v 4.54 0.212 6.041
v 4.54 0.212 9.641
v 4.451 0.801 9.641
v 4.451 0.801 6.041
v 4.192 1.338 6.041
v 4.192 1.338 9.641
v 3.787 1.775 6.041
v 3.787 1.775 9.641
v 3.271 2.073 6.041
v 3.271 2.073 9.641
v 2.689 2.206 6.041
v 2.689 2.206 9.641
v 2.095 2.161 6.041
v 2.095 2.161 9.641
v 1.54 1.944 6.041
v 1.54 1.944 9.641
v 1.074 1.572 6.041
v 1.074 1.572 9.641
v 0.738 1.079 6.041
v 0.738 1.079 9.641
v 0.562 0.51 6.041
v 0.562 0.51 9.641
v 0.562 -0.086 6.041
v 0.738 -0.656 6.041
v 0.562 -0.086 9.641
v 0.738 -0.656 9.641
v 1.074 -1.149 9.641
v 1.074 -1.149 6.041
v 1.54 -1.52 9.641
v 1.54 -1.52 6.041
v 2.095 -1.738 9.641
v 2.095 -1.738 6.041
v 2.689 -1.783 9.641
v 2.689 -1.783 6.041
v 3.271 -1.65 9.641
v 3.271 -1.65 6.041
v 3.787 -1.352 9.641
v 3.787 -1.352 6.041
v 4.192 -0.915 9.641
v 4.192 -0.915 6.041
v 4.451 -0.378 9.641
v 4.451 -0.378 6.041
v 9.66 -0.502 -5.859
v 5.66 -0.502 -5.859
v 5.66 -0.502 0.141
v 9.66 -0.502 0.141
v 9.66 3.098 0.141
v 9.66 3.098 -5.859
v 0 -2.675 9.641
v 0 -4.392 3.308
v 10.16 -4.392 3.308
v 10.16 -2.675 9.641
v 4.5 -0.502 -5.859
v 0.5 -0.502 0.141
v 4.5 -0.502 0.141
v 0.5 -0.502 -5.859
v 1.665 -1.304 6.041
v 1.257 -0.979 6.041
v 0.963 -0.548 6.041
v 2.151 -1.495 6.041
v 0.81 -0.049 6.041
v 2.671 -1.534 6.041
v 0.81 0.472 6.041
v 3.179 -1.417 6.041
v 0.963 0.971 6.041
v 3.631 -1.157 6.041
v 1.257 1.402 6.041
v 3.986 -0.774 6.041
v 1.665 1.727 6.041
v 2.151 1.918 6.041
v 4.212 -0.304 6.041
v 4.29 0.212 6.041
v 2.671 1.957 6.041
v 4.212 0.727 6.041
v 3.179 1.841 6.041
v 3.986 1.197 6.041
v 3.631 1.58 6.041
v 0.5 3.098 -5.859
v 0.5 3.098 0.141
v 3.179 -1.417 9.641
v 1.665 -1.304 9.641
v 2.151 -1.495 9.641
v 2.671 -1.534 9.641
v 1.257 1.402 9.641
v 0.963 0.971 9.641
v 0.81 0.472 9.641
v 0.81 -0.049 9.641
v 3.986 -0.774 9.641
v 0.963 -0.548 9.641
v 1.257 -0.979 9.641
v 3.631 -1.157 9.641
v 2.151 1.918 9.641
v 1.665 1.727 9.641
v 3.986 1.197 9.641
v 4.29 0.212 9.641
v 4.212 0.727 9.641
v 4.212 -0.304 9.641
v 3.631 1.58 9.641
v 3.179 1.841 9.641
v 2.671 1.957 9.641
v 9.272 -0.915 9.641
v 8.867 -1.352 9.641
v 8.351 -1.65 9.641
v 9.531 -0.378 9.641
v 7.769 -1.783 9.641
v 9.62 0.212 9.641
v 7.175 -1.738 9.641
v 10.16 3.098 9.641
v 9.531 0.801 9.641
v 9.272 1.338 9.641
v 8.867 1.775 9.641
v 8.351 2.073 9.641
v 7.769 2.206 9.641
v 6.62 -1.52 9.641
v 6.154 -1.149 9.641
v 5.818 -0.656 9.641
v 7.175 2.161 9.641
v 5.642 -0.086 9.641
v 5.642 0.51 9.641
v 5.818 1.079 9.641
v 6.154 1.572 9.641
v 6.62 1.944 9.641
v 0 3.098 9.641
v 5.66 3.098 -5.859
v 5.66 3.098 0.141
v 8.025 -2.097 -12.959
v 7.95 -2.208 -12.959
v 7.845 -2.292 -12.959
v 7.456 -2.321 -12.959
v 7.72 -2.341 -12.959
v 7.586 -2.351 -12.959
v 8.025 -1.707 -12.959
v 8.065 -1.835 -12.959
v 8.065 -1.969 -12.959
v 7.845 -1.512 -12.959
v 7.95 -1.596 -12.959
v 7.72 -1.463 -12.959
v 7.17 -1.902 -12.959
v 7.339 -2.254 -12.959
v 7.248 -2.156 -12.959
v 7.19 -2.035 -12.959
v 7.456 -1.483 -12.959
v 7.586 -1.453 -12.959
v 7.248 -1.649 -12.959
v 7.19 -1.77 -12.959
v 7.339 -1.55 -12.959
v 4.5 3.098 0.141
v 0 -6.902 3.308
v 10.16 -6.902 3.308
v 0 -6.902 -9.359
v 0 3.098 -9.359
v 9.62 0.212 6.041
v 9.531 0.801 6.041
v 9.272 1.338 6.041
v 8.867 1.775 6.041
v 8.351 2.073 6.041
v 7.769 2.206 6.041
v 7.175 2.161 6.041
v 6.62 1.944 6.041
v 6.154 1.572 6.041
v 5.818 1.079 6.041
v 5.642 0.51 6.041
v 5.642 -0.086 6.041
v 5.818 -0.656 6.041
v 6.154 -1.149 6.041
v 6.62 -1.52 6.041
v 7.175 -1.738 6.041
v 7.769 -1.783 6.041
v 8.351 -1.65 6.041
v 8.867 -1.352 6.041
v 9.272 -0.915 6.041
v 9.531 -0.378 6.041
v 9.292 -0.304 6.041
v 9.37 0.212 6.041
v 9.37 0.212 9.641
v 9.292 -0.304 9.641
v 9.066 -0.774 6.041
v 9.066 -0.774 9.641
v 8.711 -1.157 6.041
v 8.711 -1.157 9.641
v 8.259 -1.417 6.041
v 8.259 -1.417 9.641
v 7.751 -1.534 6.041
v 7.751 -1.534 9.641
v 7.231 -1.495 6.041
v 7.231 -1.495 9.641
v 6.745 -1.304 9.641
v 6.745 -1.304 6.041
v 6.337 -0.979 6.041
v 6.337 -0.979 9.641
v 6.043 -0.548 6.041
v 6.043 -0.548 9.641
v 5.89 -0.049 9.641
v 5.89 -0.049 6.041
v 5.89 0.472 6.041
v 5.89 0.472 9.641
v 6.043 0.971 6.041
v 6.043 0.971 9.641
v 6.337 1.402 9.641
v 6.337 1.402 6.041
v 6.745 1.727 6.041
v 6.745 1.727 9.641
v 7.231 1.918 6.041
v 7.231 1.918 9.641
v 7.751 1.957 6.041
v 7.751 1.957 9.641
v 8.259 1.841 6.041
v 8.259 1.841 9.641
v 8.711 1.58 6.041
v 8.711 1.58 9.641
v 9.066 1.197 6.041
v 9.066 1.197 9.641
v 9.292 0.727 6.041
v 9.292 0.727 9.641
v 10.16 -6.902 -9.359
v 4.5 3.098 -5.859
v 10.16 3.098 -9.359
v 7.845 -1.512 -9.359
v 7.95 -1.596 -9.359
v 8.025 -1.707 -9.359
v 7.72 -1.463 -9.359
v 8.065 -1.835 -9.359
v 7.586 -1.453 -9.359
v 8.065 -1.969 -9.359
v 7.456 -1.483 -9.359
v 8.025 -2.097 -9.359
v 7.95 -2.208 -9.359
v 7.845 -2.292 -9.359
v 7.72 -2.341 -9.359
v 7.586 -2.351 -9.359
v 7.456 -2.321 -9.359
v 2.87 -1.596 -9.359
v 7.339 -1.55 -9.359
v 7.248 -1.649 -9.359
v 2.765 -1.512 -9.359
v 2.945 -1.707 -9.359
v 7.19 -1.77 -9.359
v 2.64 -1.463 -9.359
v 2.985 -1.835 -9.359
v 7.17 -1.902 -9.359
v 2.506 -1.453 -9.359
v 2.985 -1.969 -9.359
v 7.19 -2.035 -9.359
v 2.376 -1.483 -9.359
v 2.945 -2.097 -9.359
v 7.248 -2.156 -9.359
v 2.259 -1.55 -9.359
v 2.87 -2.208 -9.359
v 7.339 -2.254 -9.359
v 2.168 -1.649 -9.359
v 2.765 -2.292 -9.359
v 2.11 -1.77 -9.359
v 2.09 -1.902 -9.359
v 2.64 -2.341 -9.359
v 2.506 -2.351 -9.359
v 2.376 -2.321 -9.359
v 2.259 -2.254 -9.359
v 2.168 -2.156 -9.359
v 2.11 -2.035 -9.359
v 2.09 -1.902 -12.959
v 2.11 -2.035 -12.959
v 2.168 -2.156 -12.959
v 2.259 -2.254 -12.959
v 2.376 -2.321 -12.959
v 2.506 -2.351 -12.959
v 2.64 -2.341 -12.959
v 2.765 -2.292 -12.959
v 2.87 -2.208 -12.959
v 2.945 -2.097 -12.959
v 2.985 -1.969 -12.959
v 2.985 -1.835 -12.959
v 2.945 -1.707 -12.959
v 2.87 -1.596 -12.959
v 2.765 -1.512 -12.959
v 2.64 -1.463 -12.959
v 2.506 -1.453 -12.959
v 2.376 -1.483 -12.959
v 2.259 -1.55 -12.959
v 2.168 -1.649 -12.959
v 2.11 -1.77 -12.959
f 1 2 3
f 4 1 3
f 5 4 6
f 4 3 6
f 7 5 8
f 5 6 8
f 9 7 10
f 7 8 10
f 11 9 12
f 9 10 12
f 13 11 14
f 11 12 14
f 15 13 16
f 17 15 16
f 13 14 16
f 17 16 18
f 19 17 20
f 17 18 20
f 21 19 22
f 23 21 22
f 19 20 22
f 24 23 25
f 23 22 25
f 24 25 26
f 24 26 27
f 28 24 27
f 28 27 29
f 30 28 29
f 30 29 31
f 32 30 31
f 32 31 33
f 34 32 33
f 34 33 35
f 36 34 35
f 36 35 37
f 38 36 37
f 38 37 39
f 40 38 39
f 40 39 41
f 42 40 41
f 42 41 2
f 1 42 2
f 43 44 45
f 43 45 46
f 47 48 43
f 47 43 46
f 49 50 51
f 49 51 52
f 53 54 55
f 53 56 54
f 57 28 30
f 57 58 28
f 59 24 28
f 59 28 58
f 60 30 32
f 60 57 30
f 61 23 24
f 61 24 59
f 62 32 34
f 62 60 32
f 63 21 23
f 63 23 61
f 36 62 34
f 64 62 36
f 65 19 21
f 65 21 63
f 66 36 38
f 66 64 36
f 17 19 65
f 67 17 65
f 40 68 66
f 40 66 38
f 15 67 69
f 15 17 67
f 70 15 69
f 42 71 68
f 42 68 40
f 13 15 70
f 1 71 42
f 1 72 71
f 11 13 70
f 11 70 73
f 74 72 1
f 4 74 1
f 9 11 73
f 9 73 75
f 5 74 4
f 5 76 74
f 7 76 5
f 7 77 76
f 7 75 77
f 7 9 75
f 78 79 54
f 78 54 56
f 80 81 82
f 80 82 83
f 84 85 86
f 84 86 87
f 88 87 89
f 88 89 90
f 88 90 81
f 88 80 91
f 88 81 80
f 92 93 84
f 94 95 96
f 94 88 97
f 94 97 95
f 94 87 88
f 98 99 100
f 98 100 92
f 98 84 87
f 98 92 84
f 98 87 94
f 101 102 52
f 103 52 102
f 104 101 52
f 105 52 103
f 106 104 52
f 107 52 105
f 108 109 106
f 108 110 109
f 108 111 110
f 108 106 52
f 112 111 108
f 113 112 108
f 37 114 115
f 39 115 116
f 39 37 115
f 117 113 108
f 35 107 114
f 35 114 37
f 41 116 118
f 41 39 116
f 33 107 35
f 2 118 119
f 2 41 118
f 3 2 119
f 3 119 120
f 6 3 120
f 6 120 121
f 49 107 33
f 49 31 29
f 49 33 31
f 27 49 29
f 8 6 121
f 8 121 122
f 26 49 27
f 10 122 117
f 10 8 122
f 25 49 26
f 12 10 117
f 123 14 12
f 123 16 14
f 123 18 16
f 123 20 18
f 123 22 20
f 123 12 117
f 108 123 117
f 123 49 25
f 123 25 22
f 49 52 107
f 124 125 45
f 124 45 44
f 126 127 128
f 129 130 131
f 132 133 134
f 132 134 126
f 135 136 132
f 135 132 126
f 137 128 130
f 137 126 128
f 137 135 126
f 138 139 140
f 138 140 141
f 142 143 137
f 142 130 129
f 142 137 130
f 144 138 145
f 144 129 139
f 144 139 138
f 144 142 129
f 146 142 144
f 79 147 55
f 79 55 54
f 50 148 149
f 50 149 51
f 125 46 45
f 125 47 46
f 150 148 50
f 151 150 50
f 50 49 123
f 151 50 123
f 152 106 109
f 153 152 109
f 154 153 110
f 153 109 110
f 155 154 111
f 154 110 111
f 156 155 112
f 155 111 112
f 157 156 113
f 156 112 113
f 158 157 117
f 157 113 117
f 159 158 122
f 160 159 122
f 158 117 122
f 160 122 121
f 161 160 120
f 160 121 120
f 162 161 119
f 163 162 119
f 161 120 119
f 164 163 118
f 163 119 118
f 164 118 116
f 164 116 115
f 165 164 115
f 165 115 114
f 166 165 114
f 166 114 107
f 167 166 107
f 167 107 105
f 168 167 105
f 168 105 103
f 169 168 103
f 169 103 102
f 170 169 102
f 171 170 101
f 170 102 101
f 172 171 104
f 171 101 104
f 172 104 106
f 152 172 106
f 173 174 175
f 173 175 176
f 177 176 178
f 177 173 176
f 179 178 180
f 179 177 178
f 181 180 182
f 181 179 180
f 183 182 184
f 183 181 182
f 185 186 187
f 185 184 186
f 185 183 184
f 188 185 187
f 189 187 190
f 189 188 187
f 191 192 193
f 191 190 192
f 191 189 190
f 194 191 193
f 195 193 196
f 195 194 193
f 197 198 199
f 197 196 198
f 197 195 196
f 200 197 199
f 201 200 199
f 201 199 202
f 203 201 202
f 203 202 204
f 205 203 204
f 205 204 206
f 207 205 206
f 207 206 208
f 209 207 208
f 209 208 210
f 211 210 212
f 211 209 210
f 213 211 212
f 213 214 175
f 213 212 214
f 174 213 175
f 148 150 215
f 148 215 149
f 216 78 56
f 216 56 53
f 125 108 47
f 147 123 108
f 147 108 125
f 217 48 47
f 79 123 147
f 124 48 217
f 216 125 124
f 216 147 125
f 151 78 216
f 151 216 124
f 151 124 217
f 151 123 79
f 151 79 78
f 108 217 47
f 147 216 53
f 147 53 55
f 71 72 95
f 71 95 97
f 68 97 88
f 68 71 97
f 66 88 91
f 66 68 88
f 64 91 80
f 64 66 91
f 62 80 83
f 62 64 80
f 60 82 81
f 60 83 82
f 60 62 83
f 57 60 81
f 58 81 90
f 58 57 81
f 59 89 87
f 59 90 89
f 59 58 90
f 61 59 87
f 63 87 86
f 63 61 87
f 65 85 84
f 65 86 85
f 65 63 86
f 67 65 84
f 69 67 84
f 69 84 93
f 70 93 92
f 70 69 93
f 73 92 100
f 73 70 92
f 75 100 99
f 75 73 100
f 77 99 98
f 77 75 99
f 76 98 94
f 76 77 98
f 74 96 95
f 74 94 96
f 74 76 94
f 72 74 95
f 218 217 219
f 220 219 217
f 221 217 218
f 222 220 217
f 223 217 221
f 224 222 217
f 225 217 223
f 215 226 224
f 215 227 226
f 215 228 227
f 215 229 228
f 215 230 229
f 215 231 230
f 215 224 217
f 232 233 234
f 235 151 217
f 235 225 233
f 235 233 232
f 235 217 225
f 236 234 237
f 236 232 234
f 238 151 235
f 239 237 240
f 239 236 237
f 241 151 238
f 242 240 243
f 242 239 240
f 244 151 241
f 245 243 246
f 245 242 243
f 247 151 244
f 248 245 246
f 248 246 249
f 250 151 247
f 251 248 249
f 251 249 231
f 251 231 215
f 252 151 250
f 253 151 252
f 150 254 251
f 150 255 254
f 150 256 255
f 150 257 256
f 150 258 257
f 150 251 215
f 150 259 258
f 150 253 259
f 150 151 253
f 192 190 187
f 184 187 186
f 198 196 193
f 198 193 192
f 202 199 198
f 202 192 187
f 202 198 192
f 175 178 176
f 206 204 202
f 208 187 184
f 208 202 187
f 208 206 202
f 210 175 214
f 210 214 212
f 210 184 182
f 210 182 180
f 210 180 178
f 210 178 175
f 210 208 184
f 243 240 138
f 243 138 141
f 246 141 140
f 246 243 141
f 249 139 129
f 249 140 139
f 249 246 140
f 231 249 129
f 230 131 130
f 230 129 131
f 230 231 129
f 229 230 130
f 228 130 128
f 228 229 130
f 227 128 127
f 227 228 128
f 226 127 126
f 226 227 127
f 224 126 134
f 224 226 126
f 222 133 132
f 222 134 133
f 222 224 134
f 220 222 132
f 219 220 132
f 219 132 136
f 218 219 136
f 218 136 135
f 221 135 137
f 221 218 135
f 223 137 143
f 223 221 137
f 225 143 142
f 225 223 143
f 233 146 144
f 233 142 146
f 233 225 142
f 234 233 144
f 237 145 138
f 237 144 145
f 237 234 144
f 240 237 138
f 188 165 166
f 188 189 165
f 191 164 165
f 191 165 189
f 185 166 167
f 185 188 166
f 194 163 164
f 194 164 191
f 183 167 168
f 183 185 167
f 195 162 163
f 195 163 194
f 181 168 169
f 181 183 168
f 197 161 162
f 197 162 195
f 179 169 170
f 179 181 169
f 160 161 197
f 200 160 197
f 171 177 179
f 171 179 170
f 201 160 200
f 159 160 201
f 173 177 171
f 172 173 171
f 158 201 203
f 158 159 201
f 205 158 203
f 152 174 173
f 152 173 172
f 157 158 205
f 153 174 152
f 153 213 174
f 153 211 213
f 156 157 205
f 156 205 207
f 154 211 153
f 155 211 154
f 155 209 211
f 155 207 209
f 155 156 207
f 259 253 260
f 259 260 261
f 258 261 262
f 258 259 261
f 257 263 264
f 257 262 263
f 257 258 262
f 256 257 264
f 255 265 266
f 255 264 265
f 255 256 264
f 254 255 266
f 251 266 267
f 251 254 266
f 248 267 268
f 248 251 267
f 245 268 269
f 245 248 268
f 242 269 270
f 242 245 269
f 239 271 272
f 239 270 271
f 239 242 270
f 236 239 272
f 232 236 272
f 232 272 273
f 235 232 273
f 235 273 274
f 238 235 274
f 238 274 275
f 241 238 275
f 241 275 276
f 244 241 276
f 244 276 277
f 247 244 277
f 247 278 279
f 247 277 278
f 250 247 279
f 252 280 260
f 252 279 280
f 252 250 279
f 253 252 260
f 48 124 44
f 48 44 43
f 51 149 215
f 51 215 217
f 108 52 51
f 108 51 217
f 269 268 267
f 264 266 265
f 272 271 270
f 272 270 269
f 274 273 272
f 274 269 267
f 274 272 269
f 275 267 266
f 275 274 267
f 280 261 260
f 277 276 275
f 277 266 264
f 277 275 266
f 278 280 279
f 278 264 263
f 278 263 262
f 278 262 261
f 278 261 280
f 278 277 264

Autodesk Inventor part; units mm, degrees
ref_plane "YZ Plane" through (0, 0, 0) normal (1, 0, 0) x (0, 1, 0)
ref_plane "XZ Plane" through (0, 0, 0) normal (0, 1, 0) x (-1, 0, 0)
ref_plane "XY Plane" through (0, 0, 0) normal (0, 0, 1) x (1, 0, 0)
sketch "Sketch1" plane through (0, 0, 0) normal (1, 0, 0) x (0, 1, 0)
  line L0 (-6.9022, 3.3081) -> (3.0978, 3.3081)
  line L1 (3.0978, 3.3081) -> (3.0978, -9.3586)
  line L2 (3.0978, -9.3586) -> (-6.9022, -9.3586)
  line L3 (-6.9022, -9.3586) -> (-6.9022, 3.3081)
  line L4 (-4.3921, 3.3081) -> (-2.6747, 9.6414)
  line L5 (-2.6747, 9.6414) -> (3.0978, 9.6414)
  line L6 (3.0978, 9.6414) -> (3.0978, 3.3081)
  point P0 (0, 0)
  dimension "d0" = 10
  dimension "d1" = 19
  dimension "d2" = 12.6667
extrude "Extrusion1" add sketch "Sketch1" along normal blind 10.16
sketch "Sketch2" plane through (0, -6.9022, -9.3586) normal (0, 0, -1) x (-1, 0, 0)
  line L0 (-10.16, 0) -> (-10.16, 10) projected
  line L1 (0, 0) -> (-10.16, 0) projected
  circle A0 centre (-7.62, 5) radius 0.45
  circle A1 centre (-2.54, 5) radius 0.45
  point P0 (0, 6.9022)
  dimension "d5" = 0.9
  dimension "d6" = 0.9
  dimension "d7" = 5.08
  dimension "d8" = 2.54
  dimension "d9" = 5
  dimension "d10" = 5
extrude "Extrusion2" add sketch "Sketch2" along normal blind 3.6
sketch "Sketch3" plane through (0, -2.6747, 9.6414) normal (0, 0, 1) x (1, 0, 0)
  line L0 (0, 5.7725) -> (0, 0) projected
  circle A0 centre (2.54, 2.8863) radius 2
  circle A1 centre (7.62, 2.8863) radius 2
  point P0 (0, 2.6747)
  dimension "d13" = 5.08
  dimension "d14" = 4
  dimension "d15" = 4
  dimension "d16" = 2.54
extrude "Extrusion3" cut sketch "Sketch3" against normal blind 3.6
sketch "Sketch4" plane through (2.54, 0.2116, 6.0414) normal (0, 0, 1) x (1, 0, 0)
  circle A0 centre (0, 0) radius 2 projected
  circle A1 centre (0, 0) radius 1.75
  circle A2 centre (5.08, 0) radius 1.75
  point P0 (-2.54, -0.2116)
  dimension "d19" = 5.08
  dimension "d20" = 3.5
  dimension "d21" = 3.5
extrude "Extrusion4" add sketch "Sketch4" along normal blind 3.6 contours A1 | A2
sketch "Sketch5" plane through (0, 3.0978, 9.6414) normal (0, 1, 0) x (1, 0, 0)
  line L0 (0, 19) -> (0, 0) projected
  line L1 (10.16, 19) -> (10.16, 0) projected
  line L2 (0, 19) -> (10.16, 19) projected
  line L3 (0.5, 15.5) -> (4.5, 15.5)
  line L4 (4.5, 15.5) -> (4.5, 9.5)
  line L5 (4.5, 9.5) -> (0.5, 9.5)
  line L6 (0.5, 9.5) -> (0.5, 15.5)
  line L7 (5.66, 15.5) -> (9.66, 15.5)
  line L8 (9.66, 15.5) -> (9.66, 9.5)
  line L9 (9.66, 9.5) -> (5.66, 9.5)
  line L10 (5.66, 9.5) -> (5.66, 15.5)
  point P0 (0, 9.6414)
  dimension "d24" = 4
  dimension "d25" = 4
  dimension "d26" = 0.5
  dimension "d27" = 0.5
  dimension "d28" = 3.5
  dimension "d29" = 3.5
  dimension "d30" = 6
  dimension "d31" = 6
extrude "Extrusion5" cut sketch "Sketch5" against normal blind 3.6
properties part number "ScrewTerminal"
